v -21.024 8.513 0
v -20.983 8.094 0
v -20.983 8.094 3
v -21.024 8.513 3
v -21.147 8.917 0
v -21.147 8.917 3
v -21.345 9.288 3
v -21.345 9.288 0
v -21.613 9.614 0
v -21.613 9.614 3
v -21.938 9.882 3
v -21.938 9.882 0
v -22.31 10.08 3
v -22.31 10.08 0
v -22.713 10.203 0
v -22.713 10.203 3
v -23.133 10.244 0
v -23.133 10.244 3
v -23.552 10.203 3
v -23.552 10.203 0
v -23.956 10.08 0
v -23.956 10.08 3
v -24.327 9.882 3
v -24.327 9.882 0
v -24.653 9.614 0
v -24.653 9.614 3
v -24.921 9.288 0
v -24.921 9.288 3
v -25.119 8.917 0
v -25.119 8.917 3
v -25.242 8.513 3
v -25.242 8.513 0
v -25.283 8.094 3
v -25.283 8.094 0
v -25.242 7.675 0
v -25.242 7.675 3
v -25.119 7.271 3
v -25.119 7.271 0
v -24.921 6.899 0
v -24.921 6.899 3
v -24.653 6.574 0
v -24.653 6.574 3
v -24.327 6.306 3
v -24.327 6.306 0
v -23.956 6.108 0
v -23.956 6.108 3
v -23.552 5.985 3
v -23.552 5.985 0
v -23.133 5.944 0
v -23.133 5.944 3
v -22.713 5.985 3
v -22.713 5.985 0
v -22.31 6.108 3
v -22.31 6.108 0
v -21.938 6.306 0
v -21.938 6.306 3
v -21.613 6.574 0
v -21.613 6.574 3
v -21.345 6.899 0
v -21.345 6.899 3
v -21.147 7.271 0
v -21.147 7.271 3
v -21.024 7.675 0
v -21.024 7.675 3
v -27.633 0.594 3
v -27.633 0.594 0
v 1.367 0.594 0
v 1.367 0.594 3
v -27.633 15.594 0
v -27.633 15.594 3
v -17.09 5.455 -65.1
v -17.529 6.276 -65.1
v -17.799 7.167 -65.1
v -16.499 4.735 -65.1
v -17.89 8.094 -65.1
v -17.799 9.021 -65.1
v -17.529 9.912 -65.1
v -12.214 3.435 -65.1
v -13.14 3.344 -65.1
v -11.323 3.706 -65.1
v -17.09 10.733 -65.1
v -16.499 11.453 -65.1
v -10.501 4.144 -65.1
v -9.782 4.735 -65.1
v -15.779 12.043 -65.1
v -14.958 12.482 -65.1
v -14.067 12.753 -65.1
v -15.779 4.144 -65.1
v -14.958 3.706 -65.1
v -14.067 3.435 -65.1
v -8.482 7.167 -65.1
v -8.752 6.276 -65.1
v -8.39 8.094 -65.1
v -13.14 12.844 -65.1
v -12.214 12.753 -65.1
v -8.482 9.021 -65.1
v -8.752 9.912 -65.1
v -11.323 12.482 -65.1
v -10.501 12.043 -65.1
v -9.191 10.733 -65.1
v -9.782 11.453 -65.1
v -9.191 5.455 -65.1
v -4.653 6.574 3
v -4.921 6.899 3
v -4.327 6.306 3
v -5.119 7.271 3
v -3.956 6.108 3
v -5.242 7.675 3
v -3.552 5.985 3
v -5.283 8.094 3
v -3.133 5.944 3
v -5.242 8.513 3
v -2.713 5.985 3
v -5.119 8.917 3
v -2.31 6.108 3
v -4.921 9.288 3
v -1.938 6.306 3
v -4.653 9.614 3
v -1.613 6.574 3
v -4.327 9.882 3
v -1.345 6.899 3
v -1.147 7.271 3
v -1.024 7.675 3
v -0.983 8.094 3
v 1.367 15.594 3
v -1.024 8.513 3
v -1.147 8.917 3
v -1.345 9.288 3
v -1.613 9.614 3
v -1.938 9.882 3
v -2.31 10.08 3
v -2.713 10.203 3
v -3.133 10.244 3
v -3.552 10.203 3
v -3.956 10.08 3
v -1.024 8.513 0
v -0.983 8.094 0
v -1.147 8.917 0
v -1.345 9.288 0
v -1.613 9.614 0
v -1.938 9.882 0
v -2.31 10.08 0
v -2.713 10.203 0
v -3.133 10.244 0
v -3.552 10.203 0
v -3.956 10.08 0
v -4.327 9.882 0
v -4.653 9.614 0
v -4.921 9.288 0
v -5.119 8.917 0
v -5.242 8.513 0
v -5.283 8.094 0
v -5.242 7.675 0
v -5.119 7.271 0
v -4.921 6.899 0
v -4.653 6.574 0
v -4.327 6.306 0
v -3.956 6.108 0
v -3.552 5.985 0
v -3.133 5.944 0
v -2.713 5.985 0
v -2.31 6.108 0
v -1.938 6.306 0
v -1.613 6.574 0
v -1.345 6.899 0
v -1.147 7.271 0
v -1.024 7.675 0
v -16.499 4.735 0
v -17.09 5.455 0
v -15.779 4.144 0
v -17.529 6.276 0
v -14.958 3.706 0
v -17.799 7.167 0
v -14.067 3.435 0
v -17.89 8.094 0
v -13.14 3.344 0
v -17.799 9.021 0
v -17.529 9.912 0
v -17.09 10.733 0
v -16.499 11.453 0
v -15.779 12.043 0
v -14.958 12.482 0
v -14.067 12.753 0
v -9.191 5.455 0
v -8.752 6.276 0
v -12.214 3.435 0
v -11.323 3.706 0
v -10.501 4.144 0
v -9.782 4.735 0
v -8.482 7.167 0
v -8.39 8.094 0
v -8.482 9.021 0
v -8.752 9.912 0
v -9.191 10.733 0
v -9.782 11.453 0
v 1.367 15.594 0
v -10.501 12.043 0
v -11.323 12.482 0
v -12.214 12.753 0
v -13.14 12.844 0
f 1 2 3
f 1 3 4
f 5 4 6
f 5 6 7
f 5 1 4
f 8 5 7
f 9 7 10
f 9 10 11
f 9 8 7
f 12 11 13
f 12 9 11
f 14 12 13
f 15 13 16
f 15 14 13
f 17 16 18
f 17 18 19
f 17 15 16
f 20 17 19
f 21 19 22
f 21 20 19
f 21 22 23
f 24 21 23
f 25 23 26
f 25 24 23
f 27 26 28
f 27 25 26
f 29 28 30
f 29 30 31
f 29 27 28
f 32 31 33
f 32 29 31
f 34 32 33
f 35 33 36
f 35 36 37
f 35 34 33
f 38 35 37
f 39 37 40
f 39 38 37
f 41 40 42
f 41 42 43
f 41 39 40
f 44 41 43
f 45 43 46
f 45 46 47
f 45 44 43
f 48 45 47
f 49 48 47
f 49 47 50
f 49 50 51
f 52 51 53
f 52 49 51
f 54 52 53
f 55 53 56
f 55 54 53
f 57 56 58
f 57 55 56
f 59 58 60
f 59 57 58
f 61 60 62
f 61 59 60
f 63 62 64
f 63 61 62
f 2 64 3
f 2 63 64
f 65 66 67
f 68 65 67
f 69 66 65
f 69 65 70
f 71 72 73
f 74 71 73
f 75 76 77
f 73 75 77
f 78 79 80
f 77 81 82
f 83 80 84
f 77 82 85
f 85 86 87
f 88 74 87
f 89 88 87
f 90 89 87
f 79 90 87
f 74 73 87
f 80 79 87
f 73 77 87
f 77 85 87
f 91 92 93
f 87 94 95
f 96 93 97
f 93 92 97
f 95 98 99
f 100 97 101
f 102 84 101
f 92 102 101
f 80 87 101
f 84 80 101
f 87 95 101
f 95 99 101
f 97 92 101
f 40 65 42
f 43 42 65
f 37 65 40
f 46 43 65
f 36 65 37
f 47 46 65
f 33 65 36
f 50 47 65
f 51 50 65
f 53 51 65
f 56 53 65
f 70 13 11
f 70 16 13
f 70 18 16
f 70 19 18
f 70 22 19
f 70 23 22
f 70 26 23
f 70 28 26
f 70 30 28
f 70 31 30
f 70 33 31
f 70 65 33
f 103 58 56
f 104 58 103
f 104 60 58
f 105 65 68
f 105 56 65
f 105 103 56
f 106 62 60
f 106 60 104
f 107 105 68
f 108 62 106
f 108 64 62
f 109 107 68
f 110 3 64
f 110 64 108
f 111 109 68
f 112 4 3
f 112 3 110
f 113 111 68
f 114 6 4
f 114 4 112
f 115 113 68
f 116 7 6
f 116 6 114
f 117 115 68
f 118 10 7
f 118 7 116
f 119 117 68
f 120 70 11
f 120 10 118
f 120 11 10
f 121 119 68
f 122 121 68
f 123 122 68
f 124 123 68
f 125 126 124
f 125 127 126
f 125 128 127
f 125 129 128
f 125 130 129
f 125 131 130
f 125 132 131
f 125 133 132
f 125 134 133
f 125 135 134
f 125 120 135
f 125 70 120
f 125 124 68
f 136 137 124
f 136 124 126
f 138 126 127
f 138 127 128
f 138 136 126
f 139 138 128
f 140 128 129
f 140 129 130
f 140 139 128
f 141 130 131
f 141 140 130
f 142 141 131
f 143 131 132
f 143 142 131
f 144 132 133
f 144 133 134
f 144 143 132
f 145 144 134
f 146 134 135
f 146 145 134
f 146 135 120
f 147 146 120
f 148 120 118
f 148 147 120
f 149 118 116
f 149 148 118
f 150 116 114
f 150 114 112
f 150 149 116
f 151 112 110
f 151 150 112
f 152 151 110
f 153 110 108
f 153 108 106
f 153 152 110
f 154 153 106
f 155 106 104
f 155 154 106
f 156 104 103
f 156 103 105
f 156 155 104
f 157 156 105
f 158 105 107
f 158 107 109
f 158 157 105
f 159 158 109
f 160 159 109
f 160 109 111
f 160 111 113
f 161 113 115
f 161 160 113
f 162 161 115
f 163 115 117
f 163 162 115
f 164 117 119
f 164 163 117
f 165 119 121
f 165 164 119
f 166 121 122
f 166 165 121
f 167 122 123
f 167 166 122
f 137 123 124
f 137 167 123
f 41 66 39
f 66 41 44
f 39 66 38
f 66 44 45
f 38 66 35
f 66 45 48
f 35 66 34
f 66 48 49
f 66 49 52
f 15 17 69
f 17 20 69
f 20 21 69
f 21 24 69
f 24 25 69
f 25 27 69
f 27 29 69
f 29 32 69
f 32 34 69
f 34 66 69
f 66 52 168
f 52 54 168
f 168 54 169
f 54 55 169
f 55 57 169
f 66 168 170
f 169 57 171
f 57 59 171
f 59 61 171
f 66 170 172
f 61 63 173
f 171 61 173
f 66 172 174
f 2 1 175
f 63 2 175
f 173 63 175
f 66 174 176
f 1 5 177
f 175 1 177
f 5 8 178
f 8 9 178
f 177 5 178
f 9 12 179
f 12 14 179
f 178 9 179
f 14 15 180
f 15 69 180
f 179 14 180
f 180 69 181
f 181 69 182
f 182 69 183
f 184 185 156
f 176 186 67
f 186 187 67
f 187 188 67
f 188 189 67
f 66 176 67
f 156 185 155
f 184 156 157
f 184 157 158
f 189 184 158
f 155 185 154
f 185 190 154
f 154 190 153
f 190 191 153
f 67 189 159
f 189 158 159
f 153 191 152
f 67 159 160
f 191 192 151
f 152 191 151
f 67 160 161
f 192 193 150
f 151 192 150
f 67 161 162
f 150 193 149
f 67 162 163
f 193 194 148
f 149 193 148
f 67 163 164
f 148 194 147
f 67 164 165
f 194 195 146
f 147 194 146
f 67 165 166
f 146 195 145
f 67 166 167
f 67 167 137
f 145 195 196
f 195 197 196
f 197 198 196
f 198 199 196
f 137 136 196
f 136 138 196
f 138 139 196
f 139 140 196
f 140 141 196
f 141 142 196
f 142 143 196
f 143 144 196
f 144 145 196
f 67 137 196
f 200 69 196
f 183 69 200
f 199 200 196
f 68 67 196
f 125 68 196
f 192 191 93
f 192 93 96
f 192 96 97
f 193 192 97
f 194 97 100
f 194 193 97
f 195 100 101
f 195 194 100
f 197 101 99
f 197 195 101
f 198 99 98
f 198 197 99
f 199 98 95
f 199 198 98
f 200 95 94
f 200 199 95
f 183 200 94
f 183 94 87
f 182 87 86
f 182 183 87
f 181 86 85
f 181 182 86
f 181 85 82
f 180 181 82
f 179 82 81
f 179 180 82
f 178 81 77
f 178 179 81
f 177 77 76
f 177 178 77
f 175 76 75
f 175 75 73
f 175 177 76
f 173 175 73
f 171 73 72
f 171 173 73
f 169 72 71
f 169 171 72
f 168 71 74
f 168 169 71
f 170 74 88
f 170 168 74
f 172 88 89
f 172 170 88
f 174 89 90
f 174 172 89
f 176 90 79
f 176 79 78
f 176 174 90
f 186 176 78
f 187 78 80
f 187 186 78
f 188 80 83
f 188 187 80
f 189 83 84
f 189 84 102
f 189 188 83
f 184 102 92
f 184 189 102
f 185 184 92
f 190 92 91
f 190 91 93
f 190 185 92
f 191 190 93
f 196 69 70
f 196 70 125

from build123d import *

# Parameters (mm, degrees)
SKETCH1_W                = 29
SKETCH1_H                = 15
SKETCH1_R                = 2.15
SKETCH1_R_2              = 4.75
BOSS_EXTRUDE1_DEPTH      = 3
SKETCH1_3_R              = 4.75
BOSS_EXTRUDE2_DEPTH      = 3
BOSS_EXTRUDE2_DEPTH_BACK = 65.1


with BuildPart() as part:
    # Sketch1 → Boss-Extrude1 (new body)
    with BuildSketch(Plane.XY):
        with Locations((-13.13286664, 8.093964388)):
            Rectangle(SKETCH1_W, SKETCH1_H)
        with Locations((-23.13286664, 8.093964388)):
            Circle(SKETCH1_R, mode=Mode.SUBTRACT)
        with Locations((-13.140365172, 8.093964388)):
            Circle(SKETCH1_R_2, mode=Mode.SUBTRACT)
        with Locations((-3.13286664, 8.093964388)):
            Circle(SKETCH1_R, mode=Mode.SUBTRACT)
    extrude(amount=BOSS_EXTRUDE1_DEPTH)

    # Sketch1<3> → Boss-Extrude2 (add, two sides)
    with BuildSketch(Plane.XY) as boss_extrude2_sk:
        with Locations((-13.140365172, 8.093964388)):
            Circle(SKETCH1_3_R)
    extrude(amount=BOSS_EXTRUDE2_DEPTH)
    extrude(boss_extrude2_sk.sketch, amount=-BOSS_EXTRUDE2_DEPTH_BACK)


solid = part.part
